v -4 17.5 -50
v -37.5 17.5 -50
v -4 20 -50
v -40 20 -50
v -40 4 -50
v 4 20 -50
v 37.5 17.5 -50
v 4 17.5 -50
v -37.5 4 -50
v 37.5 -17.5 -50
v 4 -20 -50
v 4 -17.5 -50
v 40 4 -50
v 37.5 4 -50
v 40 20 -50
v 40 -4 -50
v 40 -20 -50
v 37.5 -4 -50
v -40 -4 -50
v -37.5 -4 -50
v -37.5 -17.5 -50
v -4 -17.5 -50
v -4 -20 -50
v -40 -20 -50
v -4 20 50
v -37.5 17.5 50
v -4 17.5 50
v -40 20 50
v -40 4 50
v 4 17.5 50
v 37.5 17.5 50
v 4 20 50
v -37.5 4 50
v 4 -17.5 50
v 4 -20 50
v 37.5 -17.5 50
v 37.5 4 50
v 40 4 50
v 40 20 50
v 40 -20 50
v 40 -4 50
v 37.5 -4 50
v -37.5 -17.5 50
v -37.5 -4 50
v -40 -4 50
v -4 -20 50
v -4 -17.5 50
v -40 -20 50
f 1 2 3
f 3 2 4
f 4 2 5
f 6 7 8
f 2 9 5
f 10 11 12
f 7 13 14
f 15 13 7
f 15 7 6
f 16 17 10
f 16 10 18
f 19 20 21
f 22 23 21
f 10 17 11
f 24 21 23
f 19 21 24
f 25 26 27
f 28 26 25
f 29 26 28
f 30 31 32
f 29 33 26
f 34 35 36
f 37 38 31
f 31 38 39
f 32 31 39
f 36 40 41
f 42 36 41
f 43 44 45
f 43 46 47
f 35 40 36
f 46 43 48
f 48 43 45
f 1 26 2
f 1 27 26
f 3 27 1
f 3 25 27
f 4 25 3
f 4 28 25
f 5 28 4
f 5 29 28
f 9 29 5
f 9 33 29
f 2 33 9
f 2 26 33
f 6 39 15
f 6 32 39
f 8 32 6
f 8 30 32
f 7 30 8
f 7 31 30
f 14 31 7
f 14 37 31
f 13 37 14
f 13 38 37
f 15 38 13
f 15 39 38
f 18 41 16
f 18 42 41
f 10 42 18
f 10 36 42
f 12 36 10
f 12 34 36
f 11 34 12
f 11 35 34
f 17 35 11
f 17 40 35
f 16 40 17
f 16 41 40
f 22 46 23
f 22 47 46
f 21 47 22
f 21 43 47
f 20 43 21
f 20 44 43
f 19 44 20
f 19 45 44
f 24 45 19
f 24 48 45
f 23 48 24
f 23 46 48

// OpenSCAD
$fn=64;

module slot2D(slot_w=8, slot_depth=10, throat_w=4, throat_depth=2) {
    union() {
        translate([0, -slot_depth/2]) square([slot_w, slot_depth], center=true);
        translate([0, slot_depth/2 - throat_depth/2]) square([throat_w, throat_depth], center=true);
    }
}

module extrusion4080_profile_2D(w=80, h=40, wall=2.5, core_w=20, core_h=20) {
    difference() {
        square([w, h], center=true);

        // Inner cavity
        square([w-2*wall, h-2*wall], center=true);

        // Central core void
        square([core_w, core_h], center=true);

        // T-slots on all four sides
        translate([0,  h/2]) slot2D();
        translate([0, -h/2]) rotate(180) slot2D();
        translate([ w/2, 0]) rotate(-90) slot2D();
        translate([-w/2, 0]) rotate(90) slot2D();
    }
}

module extrusion4080(length=100) {
    linear_extrude(height=length, center=true, convexity=10)
        extrusion4080_profile_2D();
}

extrusion4080(100);
